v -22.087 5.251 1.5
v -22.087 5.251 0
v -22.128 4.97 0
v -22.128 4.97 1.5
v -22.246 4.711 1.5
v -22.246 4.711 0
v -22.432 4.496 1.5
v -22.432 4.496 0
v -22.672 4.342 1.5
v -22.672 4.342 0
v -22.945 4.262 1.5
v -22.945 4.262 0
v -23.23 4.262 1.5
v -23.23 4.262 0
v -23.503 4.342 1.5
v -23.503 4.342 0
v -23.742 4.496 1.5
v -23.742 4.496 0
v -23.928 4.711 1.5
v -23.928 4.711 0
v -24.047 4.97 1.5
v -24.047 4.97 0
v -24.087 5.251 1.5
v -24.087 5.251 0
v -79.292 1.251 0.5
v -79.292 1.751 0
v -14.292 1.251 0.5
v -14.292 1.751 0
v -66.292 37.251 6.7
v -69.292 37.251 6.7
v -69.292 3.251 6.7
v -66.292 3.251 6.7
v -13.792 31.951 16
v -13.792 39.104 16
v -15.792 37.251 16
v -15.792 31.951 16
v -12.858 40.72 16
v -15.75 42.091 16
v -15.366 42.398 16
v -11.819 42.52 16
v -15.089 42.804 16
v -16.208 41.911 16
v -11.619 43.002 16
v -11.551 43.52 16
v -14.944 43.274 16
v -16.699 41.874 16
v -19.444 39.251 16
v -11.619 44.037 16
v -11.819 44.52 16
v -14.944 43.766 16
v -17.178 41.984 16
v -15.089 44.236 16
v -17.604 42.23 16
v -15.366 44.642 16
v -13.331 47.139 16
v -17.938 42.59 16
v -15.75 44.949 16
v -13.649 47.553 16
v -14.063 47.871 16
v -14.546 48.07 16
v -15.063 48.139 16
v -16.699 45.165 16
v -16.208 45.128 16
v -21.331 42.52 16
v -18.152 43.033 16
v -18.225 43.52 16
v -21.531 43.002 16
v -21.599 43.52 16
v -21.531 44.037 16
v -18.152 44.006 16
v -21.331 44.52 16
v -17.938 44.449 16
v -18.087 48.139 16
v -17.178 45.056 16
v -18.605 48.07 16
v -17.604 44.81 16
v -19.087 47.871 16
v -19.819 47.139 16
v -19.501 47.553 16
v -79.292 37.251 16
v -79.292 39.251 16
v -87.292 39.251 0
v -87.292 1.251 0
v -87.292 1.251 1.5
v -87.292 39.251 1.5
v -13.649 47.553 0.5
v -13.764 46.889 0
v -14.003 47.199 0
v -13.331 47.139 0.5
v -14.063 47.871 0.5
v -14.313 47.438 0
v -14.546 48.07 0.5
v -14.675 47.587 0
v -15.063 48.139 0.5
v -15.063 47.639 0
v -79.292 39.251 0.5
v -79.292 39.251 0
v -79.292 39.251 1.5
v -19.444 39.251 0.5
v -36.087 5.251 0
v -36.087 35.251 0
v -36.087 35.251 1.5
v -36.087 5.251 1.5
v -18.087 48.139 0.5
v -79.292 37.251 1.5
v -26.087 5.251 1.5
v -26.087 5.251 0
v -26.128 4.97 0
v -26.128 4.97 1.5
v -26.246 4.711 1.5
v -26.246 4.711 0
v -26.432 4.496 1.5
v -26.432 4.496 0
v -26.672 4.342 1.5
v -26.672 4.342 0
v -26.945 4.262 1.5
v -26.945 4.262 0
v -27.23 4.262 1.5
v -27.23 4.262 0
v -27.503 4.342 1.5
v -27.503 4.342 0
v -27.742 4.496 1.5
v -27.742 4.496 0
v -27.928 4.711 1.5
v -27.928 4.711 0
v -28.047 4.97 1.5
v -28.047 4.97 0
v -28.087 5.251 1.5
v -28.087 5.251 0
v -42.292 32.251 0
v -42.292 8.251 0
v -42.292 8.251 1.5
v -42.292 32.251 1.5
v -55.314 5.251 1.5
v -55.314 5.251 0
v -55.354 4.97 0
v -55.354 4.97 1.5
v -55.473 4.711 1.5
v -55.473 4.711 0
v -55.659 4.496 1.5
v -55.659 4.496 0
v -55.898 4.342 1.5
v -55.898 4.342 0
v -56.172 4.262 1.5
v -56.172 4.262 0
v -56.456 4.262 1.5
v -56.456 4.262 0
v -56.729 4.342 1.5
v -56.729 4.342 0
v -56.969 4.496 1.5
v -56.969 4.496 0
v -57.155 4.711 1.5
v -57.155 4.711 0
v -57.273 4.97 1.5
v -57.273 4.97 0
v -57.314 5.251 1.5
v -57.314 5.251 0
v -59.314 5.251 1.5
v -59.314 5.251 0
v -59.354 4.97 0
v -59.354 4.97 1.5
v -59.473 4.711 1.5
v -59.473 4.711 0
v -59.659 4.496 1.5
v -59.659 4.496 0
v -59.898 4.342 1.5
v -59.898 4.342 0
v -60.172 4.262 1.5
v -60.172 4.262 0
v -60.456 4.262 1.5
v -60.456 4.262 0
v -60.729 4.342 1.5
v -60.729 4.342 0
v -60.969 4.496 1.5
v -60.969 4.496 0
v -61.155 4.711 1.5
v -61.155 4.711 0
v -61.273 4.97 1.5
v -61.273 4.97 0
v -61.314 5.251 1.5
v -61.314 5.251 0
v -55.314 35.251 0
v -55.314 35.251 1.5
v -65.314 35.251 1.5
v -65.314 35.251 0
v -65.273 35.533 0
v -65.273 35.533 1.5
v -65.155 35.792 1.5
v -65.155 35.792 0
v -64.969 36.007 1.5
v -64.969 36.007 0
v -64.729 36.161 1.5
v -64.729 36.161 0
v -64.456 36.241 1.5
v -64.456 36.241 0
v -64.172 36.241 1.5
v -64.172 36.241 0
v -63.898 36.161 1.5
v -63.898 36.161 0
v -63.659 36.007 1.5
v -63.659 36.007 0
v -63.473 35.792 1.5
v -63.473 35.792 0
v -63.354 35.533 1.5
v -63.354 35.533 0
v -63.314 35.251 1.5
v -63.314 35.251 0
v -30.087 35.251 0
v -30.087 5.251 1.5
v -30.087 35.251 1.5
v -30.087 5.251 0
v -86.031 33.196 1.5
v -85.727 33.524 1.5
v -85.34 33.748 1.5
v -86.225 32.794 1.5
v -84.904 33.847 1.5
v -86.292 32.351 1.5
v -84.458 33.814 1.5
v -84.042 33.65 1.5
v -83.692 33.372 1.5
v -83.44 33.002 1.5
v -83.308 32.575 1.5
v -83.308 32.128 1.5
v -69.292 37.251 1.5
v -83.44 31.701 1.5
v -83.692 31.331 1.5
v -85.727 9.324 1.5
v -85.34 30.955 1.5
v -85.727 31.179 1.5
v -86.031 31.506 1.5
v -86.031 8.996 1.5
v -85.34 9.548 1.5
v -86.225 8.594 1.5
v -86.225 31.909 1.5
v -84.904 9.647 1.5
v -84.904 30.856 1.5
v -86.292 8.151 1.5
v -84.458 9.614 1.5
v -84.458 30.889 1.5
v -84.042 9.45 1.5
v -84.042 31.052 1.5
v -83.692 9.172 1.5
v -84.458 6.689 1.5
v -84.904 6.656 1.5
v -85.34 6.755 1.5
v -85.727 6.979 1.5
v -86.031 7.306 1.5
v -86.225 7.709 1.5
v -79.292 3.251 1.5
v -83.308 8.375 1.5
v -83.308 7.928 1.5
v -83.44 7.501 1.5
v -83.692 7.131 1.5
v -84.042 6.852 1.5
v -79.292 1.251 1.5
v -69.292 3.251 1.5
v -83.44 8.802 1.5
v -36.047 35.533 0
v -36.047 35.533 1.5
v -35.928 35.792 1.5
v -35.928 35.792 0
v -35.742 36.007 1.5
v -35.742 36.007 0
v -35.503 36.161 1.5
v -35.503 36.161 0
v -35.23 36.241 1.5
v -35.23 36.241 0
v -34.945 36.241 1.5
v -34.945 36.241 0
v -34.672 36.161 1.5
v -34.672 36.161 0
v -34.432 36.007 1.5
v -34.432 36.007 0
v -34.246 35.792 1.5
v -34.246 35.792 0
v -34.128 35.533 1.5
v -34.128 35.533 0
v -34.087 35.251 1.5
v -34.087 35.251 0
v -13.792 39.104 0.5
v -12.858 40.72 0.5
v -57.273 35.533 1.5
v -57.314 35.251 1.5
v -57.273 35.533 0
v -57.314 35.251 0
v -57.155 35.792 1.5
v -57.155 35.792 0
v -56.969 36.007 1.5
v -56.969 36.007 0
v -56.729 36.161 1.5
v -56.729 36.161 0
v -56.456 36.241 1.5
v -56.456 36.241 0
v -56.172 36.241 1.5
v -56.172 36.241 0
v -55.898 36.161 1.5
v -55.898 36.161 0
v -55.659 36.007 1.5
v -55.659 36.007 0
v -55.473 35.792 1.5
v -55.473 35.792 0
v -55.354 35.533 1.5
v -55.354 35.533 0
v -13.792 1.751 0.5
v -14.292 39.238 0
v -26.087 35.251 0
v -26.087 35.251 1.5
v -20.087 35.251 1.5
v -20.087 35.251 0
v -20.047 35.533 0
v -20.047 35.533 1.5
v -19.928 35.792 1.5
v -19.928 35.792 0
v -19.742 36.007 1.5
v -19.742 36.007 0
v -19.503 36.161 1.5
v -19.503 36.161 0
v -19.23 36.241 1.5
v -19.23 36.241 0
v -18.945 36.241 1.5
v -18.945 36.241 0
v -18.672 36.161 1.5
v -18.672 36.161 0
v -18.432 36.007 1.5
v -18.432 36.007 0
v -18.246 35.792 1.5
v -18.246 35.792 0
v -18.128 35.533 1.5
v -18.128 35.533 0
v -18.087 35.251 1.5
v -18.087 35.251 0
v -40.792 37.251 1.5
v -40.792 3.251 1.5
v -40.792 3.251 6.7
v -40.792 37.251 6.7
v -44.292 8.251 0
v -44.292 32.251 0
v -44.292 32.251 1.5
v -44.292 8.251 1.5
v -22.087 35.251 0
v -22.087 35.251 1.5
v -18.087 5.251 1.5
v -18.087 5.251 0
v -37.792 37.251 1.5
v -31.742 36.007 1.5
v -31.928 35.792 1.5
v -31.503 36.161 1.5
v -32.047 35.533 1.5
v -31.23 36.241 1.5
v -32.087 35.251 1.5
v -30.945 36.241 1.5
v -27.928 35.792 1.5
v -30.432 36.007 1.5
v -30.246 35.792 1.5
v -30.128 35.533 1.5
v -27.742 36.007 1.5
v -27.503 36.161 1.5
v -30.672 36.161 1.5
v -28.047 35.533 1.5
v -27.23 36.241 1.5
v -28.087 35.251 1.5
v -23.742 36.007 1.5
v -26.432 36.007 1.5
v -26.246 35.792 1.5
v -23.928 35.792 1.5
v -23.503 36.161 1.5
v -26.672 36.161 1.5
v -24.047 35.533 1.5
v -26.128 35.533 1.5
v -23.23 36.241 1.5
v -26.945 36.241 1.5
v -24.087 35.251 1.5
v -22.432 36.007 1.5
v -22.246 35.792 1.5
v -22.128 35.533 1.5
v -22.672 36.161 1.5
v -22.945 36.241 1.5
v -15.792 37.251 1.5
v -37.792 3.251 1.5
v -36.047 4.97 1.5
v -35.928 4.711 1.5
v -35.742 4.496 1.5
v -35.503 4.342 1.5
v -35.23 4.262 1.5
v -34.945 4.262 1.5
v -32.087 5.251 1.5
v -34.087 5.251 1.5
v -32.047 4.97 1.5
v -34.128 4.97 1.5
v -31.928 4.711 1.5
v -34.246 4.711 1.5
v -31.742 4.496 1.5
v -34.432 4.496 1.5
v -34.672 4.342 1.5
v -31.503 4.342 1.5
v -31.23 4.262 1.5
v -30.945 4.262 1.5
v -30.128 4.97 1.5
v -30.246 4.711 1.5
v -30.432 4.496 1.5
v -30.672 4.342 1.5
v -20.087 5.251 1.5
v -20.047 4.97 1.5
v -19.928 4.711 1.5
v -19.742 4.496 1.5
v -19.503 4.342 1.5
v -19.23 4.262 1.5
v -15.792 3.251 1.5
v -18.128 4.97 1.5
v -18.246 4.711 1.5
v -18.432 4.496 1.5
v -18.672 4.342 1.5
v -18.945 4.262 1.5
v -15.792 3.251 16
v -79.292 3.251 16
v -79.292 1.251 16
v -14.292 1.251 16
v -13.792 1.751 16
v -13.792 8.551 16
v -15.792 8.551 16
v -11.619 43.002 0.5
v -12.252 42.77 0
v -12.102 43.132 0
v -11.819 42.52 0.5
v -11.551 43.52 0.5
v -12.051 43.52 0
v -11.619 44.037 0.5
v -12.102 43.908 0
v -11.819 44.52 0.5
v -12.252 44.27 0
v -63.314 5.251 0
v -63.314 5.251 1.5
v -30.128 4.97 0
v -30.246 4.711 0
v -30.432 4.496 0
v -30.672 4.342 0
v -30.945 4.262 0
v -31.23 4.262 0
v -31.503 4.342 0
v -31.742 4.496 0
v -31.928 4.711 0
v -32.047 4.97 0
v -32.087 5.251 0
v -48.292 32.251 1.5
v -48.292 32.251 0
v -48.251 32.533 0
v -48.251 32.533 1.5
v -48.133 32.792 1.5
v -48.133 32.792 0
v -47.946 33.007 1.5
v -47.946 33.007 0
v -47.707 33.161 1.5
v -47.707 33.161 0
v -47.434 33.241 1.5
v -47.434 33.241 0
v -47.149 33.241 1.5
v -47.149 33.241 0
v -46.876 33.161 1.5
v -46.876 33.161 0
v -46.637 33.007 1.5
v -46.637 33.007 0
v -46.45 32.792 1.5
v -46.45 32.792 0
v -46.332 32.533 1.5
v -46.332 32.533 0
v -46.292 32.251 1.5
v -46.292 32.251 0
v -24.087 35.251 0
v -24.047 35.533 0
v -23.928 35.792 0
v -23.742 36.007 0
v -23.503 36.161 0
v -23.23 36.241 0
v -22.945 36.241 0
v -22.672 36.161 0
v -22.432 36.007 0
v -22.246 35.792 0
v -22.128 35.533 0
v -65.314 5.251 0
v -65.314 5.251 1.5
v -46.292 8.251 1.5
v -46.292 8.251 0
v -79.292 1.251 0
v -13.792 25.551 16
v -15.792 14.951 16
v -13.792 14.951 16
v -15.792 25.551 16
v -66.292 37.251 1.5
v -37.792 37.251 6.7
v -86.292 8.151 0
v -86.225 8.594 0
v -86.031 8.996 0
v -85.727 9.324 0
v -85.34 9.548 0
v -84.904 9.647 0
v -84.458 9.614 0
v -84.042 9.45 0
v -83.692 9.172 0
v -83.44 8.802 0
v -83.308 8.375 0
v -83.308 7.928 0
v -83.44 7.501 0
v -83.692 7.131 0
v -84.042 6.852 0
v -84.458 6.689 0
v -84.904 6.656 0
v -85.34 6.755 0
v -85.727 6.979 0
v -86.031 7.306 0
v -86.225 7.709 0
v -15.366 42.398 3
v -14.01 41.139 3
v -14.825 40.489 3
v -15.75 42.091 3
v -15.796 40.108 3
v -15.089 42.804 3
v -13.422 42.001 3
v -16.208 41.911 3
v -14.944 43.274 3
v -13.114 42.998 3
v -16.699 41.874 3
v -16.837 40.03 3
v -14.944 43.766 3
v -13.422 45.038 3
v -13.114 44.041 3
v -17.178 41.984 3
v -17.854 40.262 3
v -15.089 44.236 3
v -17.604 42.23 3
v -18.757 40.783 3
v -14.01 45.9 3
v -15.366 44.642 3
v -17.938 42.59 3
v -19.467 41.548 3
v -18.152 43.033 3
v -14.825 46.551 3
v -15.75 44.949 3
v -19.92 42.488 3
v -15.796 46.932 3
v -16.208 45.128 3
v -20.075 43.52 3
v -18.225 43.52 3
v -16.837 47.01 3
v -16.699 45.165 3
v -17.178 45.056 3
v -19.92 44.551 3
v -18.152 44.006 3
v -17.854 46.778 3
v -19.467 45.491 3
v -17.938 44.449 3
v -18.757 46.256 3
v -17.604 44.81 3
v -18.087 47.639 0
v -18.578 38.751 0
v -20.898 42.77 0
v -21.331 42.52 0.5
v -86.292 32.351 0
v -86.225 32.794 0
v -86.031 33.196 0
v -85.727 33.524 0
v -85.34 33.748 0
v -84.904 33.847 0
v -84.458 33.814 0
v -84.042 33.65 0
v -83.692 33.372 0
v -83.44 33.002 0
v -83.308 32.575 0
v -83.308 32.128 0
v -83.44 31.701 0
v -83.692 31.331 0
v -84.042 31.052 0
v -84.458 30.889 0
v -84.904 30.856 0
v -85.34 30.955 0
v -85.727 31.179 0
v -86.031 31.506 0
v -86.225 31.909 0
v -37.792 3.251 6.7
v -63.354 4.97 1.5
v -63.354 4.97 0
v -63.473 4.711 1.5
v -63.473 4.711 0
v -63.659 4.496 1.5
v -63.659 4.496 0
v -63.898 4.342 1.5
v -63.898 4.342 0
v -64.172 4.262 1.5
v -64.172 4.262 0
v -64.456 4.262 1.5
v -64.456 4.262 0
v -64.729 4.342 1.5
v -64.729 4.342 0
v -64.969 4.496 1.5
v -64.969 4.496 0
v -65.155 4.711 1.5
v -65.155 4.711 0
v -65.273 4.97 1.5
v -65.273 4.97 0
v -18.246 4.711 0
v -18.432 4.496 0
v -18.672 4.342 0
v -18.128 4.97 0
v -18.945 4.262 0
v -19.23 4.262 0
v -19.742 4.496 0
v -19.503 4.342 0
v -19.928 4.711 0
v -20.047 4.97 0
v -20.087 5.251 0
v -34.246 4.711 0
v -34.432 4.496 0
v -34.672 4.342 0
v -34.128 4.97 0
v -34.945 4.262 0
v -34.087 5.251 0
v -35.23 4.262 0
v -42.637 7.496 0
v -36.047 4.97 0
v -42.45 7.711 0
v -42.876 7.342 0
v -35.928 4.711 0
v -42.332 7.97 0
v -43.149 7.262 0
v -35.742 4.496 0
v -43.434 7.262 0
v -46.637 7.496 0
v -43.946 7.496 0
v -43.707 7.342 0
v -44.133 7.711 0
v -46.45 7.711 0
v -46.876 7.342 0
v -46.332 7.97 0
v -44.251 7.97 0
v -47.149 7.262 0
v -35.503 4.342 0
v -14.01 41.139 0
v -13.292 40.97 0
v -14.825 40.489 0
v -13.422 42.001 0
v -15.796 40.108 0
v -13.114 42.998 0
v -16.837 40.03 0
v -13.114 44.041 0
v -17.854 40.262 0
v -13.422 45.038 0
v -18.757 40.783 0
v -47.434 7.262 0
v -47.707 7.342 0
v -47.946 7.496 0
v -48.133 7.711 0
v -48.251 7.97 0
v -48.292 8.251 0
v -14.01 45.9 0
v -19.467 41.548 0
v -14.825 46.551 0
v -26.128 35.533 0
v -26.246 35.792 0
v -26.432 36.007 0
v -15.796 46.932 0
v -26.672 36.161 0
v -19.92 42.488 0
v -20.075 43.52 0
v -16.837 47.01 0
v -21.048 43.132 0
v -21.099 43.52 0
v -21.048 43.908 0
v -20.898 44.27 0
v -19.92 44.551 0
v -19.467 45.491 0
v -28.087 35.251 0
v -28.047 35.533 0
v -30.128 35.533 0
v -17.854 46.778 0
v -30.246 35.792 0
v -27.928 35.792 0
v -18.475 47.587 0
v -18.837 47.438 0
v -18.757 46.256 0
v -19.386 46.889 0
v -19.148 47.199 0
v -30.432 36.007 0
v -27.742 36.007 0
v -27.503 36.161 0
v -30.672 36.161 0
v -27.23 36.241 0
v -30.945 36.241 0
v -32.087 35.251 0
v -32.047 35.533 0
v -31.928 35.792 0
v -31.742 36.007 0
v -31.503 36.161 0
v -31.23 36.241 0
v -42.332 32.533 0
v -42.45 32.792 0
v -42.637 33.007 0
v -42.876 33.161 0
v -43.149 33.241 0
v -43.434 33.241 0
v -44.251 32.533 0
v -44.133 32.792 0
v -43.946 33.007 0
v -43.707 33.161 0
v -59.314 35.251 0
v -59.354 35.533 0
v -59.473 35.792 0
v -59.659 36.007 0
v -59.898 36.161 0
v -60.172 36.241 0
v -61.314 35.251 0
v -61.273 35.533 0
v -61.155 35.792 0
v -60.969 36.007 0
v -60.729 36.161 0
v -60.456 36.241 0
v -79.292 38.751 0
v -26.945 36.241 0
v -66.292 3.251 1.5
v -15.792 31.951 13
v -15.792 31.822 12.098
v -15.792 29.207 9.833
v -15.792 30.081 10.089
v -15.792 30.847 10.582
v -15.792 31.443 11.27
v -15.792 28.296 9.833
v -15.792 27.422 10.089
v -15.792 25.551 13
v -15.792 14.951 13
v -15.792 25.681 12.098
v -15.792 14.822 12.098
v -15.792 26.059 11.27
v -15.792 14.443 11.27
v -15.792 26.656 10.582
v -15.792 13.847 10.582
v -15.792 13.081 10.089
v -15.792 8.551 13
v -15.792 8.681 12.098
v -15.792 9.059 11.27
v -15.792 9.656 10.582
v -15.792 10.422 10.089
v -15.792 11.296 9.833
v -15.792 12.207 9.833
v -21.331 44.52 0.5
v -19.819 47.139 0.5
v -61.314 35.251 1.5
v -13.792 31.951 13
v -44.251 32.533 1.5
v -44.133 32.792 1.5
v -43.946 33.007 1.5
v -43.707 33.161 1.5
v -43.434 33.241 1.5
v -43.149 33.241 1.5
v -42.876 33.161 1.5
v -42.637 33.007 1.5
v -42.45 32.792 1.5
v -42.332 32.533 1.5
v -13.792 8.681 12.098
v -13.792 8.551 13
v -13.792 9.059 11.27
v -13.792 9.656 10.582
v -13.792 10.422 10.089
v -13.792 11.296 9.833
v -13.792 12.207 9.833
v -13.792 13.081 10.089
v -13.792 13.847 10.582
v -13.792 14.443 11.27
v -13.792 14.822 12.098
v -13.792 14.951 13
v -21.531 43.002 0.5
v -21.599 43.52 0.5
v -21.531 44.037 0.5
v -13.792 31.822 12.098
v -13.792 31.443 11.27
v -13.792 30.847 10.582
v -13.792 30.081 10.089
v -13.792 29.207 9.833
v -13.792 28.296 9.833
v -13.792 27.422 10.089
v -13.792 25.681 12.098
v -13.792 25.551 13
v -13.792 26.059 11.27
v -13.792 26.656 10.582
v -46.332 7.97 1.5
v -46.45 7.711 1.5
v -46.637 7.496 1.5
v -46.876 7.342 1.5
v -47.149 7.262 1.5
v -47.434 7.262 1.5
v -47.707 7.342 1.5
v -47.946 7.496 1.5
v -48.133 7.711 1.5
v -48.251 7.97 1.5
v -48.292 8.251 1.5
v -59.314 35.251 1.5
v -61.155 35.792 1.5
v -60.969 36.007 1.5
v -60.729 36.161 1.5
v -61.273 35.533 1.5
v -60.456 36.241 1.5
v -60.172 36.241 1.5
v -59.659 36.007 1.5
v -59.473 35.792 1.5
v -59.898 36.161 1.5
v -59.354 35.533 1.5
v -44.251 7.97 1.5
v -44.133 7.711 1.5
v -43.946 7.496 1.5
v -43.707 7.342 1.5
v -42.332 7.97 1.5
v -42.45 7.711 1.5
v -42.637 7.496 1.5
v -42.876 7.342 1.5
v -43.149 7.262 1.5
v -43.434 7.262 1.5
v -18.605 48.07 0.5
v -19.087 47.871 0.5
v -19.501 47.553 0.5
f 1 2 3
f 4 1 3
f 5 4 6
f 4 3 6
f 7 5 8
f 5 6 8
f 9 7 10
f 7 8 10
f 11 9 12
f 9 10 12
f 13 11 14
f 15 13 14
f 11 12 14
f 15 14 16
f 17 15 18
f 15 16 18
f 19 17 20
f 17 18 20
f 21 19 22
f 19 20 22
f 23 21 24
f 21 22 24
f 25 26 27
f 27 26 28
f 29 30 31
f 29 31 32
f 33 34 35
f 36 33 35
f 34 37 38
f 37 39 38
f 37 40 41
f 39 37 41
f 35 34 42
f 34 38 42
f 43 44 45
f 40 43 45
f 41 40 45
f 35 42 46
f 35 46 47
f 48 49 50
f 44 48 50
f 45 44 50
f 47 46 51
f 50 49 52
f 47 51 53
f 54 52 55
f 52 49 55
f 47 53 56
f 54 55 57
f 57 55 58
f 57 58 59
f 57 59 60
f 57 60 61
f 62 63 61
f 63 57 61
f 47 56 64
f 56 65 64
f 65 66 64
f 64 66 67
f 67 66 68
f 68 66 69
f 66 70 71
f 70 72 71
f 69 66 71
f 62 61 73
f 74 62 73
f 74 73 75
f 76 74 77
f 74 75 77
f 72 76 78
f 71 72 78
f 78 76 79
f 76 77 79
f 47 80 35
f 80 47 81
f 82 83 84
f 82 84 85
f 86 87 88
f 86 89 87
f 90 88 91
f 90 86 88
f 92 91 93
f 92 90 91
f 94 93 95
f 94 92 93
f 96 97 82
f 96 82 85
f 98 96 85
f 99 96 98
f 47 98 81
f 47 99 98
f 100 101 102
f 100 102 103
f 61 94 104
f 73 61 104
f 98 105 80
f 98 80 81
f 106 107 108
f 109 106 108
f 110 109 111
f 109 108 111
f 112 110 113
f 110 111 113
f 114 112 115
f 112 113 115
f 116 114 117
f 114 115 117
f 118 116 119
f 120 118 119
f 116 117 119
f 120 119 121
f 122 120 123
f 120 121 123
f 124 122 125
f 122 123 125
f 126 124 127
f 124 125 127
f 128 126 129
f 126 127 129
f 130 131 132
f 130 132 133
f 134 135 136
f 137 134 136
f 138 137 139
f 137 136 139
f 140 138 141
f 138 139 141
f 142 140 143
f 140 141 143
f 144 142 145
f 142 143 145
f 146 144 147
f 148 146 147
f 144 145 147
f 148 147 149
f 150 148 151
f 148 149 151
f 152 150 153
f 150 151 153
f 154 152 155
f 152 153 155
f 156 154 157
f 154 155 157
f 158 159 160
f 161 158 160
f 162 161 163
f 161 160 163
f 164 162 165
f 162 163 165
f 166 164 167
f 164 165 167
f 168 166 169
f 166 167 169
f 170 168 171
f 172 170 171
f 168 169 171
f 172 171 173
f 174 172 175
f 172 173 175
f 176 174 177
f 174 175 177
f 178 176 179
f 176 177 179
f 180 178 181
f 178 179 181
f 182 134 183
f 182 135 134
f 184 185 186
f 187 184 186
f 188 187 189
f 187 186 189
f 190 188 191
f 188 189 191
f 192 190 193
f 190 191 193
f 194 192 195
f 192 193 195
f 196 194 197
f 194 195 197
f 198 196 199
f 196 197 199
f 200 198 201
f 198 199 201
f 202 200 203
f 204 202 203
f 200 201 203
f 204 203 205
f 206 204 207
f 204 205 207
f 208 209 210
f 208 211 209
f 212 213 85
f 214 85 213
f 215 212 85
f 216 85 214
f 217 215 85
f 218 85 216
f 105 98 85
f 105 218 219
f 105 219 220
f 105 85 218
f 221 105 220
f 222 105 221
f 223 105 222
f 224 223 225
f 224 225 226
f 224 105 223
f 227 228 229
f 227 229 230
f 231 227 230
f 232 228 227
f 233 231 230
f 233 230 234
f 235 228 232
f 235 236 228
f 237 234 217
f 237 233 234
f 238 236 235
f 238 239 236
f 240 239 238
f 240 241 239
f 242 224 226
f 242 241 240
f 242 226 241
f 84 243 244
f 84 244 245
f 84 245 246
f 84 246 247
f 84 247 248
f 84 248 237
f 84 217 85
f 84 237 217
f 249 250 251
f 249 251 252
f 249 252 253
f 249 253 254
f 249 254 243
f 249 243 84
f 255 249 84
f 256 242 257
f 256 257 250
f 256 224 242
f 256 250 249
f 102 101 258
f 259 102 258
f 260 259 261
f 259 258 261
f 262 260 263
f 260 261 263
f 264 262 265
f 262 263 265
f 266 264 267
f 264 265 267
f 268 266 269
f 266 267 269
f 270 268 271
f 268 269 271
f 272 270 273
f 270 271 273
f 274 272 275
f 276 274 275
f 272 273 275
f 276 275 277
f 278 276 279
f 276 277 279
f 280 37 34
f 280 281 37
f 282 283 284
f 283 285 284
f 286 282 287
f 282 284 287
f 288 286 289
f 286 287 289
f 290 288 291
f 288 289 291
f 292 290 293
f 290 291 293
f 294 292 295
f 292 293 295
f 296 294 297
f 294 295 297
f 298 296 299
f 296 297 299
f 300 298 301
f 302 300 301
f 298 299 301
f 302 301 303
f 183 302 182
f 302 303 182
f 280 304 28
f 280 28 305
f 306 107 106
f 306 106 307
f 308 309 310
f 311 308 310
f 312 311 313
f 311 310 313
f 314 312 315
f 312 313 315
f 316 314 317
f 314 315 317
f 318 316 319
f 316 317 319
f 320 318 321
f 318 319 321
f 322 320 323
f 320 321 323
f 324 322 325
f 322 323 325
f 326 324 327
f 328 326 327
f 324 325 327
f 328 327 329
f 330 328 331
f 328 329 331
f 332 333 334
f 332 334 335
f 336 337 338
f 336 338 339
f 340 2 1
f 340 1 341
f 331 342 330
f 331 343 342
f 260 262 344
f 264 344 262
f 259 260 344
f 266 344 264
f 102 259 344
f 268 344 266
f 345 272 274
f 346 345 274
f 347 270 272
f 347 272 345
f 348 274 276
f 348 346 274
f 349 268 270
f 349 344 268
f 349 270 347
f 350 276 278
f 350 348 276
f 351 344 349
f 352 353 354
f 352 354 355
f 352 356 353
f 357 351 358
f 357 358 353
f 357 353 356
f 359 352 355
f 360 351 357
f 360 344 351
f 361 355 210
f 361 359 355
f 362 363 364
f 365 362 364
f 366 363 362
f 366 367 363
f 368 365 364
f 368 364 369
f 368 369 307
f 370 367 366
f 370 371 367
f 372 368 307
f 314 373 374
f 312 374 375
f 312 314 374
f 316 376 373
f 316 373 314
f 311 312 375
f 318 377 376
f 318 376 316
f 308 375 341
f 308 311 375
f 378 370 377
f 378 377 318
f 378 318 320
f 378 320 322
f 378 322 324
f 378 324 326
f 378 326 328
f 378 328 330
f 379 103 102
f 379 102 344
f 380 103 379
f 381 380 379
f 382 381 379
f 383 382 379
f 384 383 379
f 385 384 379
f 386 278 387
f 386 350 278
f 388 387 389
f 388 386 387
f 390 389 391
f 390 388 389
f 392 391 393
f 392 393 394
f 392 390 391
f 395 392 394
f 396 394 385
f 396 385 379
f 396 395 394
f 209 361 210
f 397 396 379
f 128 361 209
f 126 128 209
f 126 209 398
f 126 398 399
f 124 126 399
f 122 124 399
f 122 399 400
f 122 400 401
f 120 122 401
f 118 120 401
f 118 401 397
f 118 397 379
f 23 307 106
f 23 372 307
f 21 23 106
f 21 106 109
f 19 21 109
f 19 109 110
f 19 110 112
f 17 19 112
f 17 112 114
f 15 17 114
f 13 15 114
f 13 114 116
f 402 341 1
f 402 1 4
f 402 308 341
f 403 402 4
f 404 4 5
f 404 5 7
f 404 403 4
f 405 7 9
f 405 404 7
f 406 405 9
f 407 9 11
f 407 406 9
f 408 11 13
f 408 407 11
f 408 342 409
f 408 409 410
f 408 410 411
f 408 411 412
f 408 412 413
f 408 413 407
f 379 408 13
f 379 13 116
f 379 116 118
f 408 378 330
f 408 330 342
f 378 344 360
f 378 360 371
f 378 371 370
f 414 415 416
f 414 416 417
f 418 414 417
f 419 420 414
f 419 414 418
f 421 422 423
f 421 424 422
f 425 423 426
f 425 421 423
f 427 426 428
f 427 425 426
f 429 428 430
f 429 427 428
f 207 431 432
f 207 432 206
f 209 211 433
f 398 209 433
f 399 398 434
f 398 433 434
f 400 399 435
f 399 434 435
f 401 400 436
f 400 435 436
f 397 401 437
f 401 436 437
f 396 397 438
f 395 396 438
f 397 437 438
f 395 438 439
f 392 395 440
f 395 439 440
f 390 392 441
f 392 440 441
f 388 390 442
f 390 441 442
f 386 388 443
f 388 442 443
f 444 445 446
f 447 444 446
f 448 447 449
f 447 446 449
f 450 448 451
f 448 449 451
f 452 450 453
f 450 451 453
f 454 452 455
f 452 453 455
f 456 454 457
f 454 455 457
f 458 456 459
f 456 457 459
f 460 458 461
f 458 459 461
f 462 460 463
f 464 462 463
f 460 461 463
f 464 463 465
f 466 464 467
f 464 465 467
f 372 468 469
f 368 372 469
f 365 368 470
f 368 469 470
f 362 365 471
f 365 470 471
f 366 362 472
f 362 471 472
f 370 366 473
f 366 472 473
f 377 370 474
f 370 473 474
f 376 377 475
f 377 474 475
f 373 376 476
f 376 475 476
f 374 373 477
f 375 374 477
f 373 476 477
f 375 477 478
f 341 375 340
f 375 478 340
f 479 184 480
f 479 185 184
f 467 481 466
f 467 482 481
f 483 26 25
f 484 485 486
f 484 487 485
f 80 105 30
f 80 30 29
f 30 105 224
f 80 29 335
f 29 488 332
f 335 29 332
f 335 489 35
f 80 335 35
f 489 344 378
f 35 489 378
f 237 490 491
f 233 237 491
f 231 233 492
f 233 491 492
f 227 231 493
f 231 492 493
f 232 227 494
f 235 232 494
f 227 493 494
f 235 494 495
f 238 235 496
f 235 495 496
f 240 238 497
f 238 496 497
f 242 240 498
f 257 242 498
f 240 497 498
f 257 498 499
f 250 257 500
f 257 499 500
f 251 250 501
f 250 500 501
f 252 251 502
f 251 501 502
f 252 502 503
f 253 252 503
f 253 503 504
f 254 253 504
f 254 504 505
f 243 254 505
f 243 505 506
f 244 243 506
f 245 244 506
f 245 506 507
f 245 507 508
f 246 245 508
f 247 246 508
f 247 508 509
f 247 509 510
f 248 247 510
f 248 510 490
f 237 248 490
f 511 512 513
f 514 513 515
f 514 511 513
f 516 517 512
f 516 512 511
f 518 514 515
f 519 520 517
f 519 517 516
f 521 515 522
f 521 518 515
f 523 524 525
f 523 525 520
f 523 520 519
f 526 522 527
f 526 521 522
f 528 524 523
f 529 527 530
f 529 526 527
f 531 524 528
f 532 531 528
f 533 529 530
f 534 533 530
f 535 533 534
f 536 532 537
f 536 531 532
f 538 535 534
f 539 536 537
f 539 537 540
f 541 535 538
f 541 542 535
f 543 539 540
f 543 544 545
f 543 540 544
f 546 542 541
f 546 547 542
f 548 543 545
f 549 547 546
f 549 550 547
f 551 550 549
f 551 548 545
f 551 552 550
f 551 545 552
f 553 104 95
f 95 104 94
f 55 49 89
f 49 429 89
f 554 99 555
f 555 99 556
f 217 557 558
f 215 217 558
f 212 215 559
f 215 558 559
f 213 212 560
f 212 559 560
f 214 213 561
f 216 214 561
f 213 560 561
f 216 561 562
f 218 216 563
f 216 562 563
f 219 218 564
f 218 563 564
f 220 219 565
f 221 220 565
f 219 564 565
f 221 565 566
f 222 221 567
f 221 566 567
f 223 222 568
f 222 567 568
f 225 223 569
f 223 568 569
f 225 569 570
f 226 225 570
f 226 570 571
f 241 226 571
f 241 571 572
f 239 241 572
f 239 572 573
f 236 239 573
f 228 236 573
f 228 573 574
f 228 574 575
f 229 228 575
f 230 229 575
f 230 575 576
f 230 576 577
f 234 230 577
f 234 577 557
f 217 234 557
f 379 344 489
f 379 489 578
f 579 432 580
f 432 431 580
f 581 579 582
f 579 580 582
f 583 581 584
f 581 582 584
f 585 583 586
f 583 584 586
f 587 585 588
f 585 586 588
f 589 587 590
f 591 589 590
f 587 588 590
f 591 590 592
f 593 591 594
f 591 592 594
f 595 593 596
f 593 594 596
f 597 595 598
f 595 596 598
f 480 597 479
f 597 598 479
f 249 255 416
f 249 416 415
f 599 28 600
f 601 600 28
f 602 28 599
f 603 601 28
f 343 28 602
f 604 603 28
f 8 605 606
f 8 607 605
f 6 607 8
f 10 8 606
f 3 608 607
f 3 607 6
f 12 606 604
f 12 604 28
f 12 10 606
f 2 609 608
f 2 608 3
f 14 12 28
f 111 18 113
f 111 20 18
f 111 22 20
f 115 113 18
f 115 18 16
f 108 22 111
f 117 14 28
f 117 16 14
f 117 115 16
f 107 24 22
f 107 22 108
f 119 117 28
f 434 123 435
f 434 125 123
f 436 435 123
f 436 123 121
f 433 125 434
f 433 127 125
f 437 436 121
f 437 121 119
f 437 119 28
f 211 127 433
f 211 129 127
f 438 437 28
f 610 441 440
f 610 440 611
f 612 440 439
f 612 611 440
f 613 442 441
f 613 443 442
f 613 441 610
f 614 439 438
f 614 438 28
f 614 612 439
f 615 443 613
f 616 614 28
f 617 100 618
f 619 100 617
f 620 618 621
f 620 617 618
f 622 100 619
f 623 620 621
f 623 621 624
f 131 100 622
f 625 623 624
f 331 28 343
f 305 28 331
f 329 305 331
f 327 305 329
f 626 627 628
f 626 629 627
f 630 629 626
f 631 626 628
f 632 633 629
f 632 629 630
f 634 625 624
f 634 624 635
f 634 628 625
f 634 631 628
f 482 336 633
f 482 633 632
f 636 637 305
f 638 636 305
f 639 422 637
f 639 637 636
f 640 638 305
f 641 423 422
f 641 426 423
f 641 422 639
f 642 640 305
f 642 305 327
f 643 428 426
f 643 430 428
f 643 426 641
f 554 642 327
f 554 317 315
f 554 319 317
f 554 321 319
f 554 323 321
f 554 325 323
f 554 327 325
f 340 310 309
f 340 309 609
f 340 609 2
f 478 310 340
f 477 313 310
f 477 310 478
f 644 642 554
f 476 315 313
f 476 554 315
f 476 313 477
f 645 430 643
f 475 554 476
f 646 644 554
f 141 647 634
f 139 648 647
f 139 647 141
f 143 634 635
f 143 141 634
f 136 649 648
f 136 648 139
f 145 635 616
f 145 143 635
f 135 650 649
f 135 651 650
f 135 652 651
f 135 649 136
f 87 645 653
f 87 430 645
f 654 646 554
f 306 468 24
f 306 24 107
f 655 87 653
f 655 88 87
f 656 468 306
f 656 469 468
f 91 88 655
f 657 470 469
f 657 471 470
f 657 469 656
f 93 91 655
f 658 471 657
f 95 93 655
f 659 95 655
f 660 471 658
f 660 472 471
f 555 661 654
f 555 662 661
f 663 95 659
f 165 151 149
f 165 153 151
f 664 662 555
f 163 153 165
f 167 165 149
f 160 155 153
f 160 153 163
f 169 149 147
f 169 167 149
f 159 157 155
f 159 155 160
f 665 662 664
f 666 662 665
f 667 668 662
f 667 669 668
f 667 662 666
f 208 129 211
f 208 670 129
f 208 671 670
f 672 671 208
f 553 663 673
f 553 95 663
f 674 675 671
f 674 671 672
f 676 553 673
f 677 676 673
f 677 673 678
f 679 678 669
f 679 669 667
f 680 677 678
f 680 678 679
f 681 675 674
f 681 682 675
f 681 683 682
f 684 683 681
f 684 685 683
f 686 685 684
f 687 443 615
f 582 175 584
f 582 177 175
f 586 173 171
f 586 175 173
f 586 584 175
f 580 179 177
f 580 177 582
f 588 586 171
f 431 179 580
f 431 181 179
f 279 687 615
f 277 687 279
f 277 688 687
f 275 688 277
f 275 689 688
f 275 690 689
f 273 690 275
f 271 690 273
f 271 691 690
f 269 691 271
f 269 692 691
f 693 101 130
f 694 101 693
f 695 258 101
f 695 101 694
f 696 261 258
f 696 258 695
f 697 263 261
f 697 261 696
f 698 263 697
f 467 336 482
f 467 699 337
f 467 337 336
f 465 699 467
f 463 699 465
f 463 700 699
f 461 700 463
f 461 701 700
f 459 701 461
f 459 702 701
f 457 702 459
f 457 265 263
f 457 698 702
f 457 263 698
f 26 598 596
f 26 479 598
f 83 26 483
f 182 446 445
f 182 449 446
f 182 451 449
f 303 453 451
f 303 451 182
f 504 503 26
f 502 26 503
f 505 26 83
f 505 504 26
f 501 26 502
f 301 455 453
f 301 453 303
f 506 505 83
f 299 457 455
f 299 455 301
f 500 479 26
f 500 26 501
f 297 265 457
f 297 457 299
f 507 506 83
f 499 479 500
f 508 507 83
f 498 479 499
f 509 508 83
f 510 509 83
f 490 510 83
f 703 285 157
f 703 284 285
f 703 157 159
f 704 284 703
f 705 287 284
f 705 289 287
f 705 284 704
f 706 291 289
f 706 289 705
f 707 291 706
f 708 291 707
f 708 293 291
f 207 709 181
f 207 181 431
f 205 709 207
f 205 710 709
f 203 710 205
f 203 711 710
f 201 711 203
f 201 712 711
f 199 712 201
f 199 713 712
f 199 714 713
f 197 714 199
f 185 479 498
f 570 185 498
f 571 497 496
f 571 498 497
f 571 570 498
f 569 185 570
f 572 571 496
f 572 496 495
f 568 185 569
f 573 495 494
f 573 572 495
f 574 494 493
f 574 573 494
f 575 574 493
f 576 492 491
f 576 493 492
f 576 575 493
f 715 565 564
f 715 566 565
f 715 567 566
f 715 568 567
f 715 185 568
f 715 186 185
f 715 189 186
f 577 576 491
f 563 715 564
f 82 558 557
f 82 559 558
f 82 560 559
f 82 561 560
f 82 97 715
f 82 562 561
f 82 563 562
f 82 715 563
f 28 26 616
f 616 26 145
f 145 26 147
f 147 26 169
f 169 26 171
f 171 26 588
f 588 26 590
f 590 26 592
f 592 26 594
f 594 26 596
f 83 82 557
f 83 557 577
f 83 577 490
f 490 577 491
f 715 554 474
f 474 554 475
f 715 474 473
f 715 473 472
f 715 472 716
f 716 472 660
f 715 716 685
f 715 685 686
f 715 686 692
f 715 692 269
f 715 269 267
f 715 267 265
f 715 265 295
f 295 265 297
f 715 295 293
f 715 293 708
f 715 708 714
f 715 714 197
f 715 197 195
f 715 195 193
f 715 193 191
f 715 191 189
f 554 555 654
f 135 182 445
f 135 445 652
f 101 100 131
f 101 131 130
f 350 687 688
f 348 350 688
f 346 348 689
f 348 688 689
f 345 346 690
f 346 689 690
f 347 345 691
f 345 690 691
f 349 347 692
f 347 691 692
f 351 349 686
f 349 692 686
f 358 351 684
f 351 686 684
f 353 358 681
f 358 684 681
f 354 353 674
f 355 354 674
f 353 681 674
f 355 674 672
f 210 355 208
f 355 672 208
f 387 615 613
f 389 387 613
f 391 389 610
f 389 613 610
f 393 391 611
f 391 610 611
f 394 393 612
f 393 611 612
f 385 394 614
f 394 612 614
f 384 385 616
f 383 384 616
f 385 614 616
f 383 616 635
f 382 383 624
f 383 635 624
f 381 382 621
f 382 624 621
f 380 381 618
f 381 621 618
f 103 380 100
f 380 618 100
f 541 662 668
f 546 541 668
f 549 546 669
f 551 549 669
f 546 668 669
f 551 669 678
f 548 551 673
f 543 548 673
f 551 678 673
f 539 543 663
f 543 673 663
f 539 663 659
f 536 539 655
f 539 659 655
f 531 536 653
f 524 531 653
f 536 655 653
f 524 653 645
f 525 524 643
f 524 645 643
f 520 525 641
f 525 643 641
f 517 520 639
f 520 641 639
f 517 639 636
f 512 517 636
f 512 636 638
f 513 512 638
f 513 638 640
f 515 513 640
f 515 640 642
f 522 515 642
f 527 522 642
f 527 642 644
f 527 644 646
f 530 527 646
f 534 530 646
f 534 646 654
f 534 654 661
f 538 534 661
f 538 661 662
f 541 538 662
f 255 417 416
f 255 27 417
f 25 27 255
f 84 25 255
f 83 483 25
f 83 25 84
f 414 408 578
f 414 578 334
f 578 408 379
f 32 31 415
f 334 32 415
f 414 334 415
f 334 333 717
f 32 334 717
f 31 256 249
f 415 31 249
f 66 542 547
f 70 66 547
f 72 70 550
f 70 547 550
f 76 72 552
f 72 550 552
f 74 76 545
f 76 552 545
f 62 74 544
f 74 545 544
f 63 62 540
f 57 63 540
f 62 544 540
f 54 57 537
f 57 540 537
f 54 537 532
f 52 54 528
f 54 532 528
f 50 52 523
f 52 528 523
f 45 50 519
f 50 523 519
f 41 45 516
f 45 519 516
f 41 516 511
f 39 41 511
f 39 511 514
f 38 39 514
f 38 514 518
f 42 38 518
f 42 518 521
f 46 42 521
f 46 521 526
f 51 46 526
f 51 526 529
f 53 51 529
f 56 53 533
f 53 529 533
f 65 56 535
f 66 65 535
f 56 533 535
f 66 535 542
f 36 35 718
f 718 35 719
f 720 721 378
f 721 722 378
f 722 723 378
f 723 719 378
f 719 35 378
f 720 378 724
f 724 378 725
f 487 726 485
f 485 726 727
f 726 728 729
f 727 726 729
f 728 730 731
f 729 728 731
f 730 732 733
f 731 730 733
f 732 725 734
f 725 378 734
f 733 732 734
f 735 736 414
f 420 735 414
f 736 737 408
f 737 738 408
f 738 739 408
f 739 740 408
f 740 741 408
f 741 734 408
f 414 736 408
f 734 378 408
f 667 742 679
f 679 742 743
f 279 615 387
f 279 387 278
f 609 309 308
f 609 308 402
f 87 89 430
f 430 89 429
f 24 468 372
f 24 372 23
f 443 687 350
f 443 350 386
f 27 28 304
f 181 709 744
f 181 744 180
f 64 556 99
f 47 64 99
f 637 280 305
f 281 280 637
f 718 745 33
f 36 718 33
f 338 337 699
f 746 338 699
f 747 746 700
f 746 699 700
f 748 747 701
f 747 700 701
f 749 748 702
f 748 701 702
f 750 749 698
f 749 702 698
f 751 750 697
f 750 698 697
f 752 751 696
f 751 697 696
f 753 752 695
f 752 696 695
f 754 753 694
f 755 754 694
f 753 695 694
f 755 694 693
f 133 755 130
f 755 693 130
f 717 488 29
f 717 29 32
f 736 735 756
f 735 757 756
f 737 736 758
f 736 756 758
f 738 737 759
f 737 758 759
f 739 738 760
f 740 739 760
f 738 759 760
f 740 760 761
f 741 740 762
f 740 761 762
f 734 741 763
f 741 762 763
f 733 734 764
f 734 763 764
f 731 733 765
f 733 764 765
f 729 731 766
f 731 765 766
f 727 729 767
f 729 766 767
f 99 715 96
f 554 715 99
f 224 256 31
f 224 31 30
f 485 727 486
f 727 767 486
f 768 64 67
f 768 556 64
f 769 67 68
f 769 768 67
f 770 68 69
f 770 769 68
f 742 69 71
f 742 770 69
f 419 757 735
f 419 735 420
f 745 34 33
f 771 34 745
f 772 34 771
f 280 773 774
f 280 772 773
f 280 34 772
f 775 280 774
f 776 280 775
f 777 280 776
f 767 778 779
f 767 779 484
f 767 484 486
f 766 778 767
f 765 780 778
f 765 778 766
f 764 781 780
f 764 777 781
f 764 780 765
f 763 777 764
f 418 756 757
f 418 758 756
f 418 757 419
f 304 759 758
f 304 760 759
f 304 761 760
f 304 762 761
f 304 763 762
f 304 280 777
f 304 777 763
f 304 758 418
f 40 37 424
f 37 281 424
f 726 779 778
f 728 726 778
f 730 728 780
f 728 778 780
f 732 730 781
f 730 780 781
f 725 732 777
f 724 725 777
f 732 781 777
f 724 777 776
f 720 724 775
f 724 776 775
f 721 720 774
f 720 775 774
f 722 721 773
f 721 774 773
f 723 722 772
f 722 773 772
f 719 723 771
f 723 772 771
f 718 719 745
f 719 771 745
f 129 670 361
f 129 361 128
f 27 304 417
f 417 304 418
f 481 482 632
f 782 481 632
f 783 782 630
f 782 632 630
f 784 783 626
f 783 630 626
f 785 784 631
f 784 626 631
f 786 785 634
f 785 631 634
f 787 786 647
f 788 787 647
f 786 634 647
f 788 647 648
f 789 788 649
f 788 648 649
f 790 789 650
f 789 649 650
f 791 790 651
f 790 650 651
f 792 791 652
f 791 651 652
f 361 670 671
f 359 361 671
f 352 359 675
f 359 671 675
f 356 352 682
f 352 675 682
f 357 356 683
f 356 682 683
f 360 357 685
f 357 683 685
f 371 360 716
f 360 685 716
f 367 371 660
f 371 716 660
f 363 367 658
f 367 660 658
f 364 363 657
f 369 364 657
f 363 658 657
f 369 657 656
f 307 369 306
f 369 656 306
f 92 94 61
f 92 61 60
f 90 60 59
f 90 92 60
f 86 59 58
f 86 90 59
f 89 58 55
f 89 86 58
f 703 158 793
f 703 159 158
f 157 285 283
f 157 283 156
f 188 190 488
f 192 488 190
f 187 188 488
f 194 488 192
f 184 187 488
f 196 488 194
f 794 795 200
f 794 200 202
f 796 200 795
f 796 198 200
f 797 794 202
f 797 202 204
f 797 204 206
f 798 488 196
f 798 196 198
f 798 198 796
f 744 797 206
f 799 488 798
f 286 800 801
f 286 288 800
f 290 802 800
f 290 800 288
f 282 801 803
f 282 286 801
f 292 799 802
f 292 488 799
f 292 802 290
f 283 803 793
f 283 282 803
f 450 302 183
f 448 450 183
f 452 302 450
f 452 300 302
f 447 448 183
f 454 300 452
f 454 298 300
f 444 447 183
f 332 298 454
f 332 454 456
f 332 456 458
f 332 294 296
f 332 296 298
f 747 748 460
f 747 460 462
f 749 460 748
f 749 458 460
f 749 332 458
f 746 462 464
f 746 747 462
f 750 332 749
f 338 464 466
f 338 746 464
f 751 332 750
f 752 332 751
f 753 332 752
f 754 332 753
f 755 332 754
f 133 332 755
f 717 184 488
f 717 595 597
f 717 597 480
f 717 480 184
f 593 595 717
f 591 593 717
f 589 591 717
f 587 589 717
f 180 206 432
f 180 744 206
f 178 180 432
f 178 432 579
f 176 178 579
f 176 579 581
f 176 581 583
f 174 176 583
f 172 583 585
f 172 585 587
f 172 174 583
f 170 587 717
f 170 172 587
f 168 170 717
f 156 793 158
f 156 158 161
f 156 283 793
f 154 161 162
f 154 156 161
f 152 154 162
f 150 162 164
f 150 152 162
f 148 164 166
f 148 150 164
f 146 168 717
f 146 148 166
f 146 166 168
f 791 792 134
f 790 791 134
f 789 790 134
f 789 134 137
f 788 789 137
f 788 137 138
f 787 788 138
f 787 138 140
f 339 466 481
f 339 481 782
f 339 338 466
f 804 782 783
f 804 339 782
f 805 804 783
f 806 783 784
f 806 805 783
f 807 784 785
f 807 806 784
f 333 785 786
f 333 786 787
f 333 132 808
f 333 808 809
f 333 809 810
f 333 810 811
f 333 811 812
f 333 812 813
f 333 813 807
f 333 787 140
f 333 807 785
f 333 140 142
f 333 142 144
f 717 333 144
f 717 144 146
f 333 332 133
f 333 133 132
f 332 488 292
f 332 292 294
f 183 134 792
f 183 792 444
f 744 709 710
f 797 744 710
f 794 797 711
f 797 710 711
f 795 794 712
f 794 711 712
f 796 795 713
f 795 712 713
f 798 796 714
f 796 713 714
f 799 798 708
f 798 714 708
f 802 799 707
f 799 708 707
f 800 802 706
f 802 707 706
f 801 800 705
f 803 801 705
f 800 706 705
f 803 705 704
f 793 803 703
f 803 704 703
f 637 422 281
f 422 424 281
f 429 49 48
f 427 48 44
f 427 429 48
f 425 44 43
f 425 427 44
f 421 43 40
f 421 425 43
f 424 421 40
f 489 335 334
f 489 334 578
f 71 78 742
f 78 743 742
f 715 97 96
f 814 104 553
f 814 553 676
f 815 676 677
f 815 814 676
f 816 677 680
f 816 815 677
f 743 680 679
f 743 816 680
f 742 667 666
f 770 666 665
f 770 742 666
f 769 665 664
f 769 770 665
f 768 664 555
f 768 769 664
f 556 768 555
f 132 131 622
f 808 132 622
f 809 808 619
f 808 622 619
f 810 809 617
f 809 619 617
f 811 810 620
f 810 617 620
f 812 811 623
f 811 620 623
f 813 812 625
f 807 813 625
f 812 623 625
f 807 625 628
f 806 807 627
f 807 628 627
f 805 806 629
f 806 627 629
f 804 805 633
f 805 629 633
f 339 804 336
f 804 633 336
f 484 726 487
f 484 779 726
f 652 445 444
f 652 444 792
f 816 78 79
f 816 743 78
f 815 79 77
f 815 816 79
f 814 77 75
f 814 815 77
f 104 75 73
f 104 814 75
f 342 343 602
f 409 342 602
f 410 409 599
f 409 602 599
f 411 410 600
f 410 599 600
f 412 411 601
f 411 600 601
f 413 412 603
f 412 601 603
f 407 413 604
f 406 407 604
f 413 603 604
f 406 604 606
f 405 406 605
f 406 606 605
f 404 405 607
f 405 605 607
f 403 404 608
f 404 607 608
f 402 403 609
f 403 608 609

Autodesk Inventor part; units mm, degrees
ref_plane "YZ Plane" through (0, 0, 0) normal (1, 0, 0) x (0, 1, 0)
ref_plane "XZ Plane" through (0, 0, 0) normal (0, 1, 0) x (-1, 0, 0)
ref_plane "XY Plane" through (0, 0, 0) normal (0, 0, 1) x (1, 0, 0)
sketch "Sketch1" plane through (0, 0, 0) normal (0, 0, 1) x (1, 0, 0)
  line L0 (-79.2915, 39.2514) -> (-13.7915, 39.2514)
  line L1 (-13.7915, 39.2514) -> (-13.7915, 1.2514)
  line L2 (-13.7915, 1.2514) -> (-79.2915, 1.2514)
  line L3 (-79.2915, 1.2514) -> (-79.2915, 39.2514)
  point P0 (0, 0)
extrude "Extrusion1" add sketch "Sketch1" along normal blind 1.5
sketch "Sketch2" plane through (0, 0, 1.5) normal (0, 0, 1) x (1, 0, 0)
  line L0 (-13.7915, 39.2514) -> (-13.7915, 1.2514) projected
  line L1 (-79.2915, 39.2514) -> (-13.7915, 39.2514) projected
  line L2 (-79.2915, 1.2514) -> (-79.2915, 39.2514) projected
  line L3 (-13.7915, 1.2514) -> (-79.2915, 1.2514) projected
  line L4 (-79.2915, 37.2514) -> (-15.7915, 37.2514)
  line L5 (-15.7915, 37.2514) -> (-15.7915, 3.2514)
  line L6 (-15.7915, 3.2514) -> (-79.2915, 3.2514)
  point P0 (0, 0)
  dimension "d2" = 2
  dimension "d3" = 2
  dimension "d4" = 2
extrude "Extrusion2" add sketch "Sketch2" along normal blind 14.5 contours L0 L3 L2 L6 L5 L4 L1
sketch "Sketch3" plane through (-13.7915, 1.2514, 0) normal (1, 0, 0) x (0, 0, -1)
  line L0 (0, 0) -> (-16, 0) projected
  line L1 (0, 38) -> (0, 0) projected
  line L2 (0, 38) -> (-16, 38) projected
  line L3 (-16, 38) -> (-16, 0) projected
  arc A0 (-13, 24.3) -> (-13, 30.7) centre (-13, 27.5) ccw
  line L4 (-13, 30.7) -> (-16, 30.7)
  line L5 (-13, 24.3) -> (-16, 24.3)
  arc A1 (-13, 7.3) -> (-13, 13.7) centre (-13, 10.5) ccw
  line L6 (-13, 7.3) -> (-16, 7.3)
  line L7 (-13, 13.7) -> (-16, 13.7)
  point P0 (0, -1.2514)
  dimension "d7" = 13
  dimension "d8" = 10.5
  dimension "d9" = 3.2
  dimension "d10" = 13
  dimension "d11" = 10.5
extrude "Extrusion3" cut sketch "Sketch3" against normal blind 13 contours L3 L7 A1 L6 | L4 A0 L5 L3
sketch "Sketch4" plane through (0, 0, 0) normal (0, 0, -1) x (-1, 0, 0)
  line L0 (21.3312, 42.5198) -> (19.2419, 38.901)
  arc A0 (21.3312, 42.5198) -> (21.3312, 44.5198) centre (19.5992, 43.5198) ccw
  line L1 (19.8192, 47.1386) -> (21.3312, 44.5198)
  arc A1 (19.8192, 47.1386) -> (18.0872, 48.1386) centre (18.0872, 46.1386) ccw
  line L2 (15.0633, 48.1386) -> (18.0872, 48.1386)
  arc A2 (15.0633, 48.1386) -> (13.3312, 47.1386) centre (15.0633, 46.1386) ccw
  line L3 (11.8192, 44.5198) -> (13.3312, 47.1386)
  arc A3 (11.8192, 44.5198) -> (11.8192, 42.5198) centre (13.5513, 43.5198) ccw
  line L4 (12.8585, 40.7198) -> (11.8192, 42.5198)
  circle A4 centre (16.5752, 43.5198) radius 1.65
  line L5 (12.8585, 40.7198) -> (13.7938, 39.0998)
  line L6 (13.7938, 39.0998) -> (19.3567, 39.0998)
  point P0 (0, 0)
  point P1 (16.0419, 38.7198)
extrude "Extrusion4" add sketch "Sketch4" against normal blind 16
sketch "Sketch5" plane through (-79.2915, 1.2514, 0) normal (-1, 0, 0) x (0, 0, 1)
  line L0 (1.5, 2) -> (1.5, 36) projected
  line L1 (0, 38) -> (16, 38) projected
  line L2 (0, 0) -> (0, 38) projected
  line L3 (0, 0) -> (16, 0) projected
  line L4 (1.5, 36) -> (1.5, 38)
  line L5 (1.5, 2) -> (1.5, 0)
  point P0 (0, -1.2514)
extrude "Extrusion5" add sketch "Sketch5" along normal blind 8
sketch "Sketch6" plane through (0, 0, 1.5) normal (0, 0, 1) x (1, 0, 0)
  line L0 (-15.7915, 37.2514) -> (-79.2915, 37.2514) projected
  line L1 (-79.2915, 3.2514) -> (-15.7915, 3.2514) projected
  line L2 (-15.7915, 3.2514) -> (-15.7915, 37.2514) projected
  line L3 (-69.2915, 37.2514) -> (-66.2915, 37.2514)
  line L4 (-66.2915, 37.2514) -> (-66.2915, 3.2514)
  line L5 (-66.2915, 3.2514) -> (-69.2915, 3.2514)
  line L6 (-69.2915, 3.2514) -> (-69.2915, 37.2514)
  line L7 (-40.7915, 37.2514) -> (-37.7915, 37.2514)
  line L8 (-37.7915, 37.2514) -> (-37.7915, 3.2514)
  line L9 (-37.7915, 3.2514) -> (-40.7915, 3.2514)
  line L10 (-40.7915, 3.2514) -> (-40.7915, 37.2514)
  point P0 (0, 0)
  dimension "d18" = 3
  dimension "d19" = 3
  dimension "d20" = 22
  dimension "d21" = 10
extrude "Extrusion6" add sketch "Sketch6" along normal blind 5.2 contours L8 L1 L10 L0 | L4 L1 L6 L0
sketch "Sketch7" plane through (0, 0, 0) normal (0, 0, -1) x (-1, 0, 0)
  line L0 (87.2915, 39.2514) -> (19.4442, 39.2514) projected
  line L1 (18.0872, 35.2514) -> (20.0872, 35.2514)
  line L2 (20.0872, 35.2514) -> (20.0872, 5.2514)
  line L3 (20.0872, 5.2514) -> (18.0872, 5.2514)
  line L4 (18.0872, 5.2514) -> (18.0872, 35.2514)
  circle A0 centre (19.0872, 35.2514) radius 1
  circle A1 centre (19.0872, 5.2514) radius 1
  point P0 (0, 0)
  dimension "d24" = 2
  dimension "d25" = 30
  dimension "d26" = 4
  dimension "d32" = 2
  dimension "d33" = 2
extrude "Extrusion7" cut sketch "Sketch7" against normal blind 2
pattern_linear "Rectangular Pattern1" count 5 spacing 4 along (-1, 0, 0) of "Extrusion7"
sketch "Sketch8" plane through (0, 0, 0) normal (0, 0, -1) x (-1, 0, 0)
  line L0 (13.7915, 1.2514) -> (87.2915, 1.2514) projected
  line L1 (87.2915, 1.2514) -> (87.2915, 39.2514) projected
  line L2 (42.2915, 32.2514) -> (44.2915, 32.2514)
  line L3 (44.2915, 32.2514) -> (44.2915, 8.2514)
  line L4 (44.2915, 8.2514) -> (42.2915, 8.2514)
  line L5 (42.2915, 8.2514) -> (42.2915, 32.2514)
  circle A0 centre (43.2915, 32.2514) radius 1
  circle A1 centre (43.2915, 8.2514) radius 1
  point P0 (0, 0)
  dimension "d34" = 2
  dimension "d35" = 24
  dimension "d36" = 43
  dimension "d37" = 7
extrude "Extrusion8" cut sketch "Sketch8" against normal blind 2
pattern_linear "Rectangular Pattern2" count 2 spacing 4 along (-1, 0, 0) of "Extrusion8"
sketch "Sketch9" plane through (0, 0, 0) normal (0, 0, -1) x (-1, 0, 0)
  line L0 (87.2915, 39.2514) -> (19.4442, 39.2514) projected
  line L1 (55.3139, 35.2514) -> (57.3139, 35.2514)
  line L2 (57.3139, 35.2514) -> (57.3139, 5.2514)
  line L3 (57.3139, 5.2514) -> (55.3139, 5.2514)
  line L4 (55.3139, 5.2514) -> (55.3139, 35.2514)
  circle A0 centre (56.3139, 35.2514) radius 1
  circle A1 centre (56.3139, 5.2514) radius 1
  point P0 (0, 0)
  dimension "d43" = 30
  dimension "d44" = 4
extrude "Extrusion9" cut sketch "Sketch9" against normal blind 2
pattern_linear "Rectangular Pattern3" count 3 spacing 4 along (-1, 0, 0) of "Extrusion9"
sketch "Sketch11" plane through (0, 0, 0) normal (0, 0, -1) x (-1, 0, 0)
  line L0 (87.2915, 1.2514) -> (87.2915, 39.2514) projected
  line L1 (87.2915, 39.2514) -> (19.4442, 39.2514) projected
  circle A0 centre (84.7915, 32.3514) radius 1.5
  circle A1 centre (84.7915, 8.1514) radius 1.5
  point P0 (0, 0)
  dimension "d50" = 2.5
  dimension "d51" = 2.5
  dimension "d52" = 24.2
  dimension "d53" = 6.9
extrude "Extrusion10" cut sketch "Sketch11" against normal blind 10
chamfer "Chamfer1" distance 0.5 angle 45 13 edges at (-50.5415, 1.2514, 0) (-13.7915, 20.1776, 0) (-13.7915, 1.2514, 8) (-53.3678, 39.2514, 0) (-20.3877, 40.8856, 0) (-21.5992, 43.5198, 0) (-20.5752, 45.8292, 0) (-19.0872, 47.8707, 0) (-16.5752, 48.1386, 0) (-14.0633, 47.8707, 0) (-12.5752, 45.8292, 0) (-11.5513, 43.5198, 0) (-12.8054, 40.8118, 0)
sketch "Sketch12" plane through (0, 0, 0) normal (0, 0, -1) x (-1, 0, 0)
  line L0 (87.2915, 1.7514) -> (87.2915, 38.7514) projected
  circle A0 centre (84.7915, 32.3514) radius 1.5 projected
  circle A1 centre (84.7915, 8.1514) radius 1.5 projected
  line L1 (87.2915, 39.2514) -> (79.2915, 39.2514)
  line L2 (79.2915, 39.2514) -> (79.2915, 1.2514)
  line L3 (79.2915, 1.2514) -> (87.2915, 1.2514)
  line L4 (87.2915, 1.2514) -> (87.2915, 39.2514)
  line L5 (14.2915, 1.2514) -> (87.2915, 1.2514) projected
  point P0 (0, 0)
  dimension "d59" = 38
  dimension "d60" = 8
  dimension "d61" = 0
  dimension "d64" = 0
extrude "Extrusion11" add sketch "Sketch12" against normal blind 1
sketch "Sketch13" plane through (0, 0, 0) normal (0, 0, -1) x (-1, 0, 0)
  circle A0 centre (16.5752, 43.5198) radius 1.65 projected
  circle A1 centre (16.5752, 43.5198) radius 3.5
  point P0 (0, 0)
extrude "Extrusion12" cut sketch "Sketch13" against normal blind 3
properties part number "case add on sdr botom"
